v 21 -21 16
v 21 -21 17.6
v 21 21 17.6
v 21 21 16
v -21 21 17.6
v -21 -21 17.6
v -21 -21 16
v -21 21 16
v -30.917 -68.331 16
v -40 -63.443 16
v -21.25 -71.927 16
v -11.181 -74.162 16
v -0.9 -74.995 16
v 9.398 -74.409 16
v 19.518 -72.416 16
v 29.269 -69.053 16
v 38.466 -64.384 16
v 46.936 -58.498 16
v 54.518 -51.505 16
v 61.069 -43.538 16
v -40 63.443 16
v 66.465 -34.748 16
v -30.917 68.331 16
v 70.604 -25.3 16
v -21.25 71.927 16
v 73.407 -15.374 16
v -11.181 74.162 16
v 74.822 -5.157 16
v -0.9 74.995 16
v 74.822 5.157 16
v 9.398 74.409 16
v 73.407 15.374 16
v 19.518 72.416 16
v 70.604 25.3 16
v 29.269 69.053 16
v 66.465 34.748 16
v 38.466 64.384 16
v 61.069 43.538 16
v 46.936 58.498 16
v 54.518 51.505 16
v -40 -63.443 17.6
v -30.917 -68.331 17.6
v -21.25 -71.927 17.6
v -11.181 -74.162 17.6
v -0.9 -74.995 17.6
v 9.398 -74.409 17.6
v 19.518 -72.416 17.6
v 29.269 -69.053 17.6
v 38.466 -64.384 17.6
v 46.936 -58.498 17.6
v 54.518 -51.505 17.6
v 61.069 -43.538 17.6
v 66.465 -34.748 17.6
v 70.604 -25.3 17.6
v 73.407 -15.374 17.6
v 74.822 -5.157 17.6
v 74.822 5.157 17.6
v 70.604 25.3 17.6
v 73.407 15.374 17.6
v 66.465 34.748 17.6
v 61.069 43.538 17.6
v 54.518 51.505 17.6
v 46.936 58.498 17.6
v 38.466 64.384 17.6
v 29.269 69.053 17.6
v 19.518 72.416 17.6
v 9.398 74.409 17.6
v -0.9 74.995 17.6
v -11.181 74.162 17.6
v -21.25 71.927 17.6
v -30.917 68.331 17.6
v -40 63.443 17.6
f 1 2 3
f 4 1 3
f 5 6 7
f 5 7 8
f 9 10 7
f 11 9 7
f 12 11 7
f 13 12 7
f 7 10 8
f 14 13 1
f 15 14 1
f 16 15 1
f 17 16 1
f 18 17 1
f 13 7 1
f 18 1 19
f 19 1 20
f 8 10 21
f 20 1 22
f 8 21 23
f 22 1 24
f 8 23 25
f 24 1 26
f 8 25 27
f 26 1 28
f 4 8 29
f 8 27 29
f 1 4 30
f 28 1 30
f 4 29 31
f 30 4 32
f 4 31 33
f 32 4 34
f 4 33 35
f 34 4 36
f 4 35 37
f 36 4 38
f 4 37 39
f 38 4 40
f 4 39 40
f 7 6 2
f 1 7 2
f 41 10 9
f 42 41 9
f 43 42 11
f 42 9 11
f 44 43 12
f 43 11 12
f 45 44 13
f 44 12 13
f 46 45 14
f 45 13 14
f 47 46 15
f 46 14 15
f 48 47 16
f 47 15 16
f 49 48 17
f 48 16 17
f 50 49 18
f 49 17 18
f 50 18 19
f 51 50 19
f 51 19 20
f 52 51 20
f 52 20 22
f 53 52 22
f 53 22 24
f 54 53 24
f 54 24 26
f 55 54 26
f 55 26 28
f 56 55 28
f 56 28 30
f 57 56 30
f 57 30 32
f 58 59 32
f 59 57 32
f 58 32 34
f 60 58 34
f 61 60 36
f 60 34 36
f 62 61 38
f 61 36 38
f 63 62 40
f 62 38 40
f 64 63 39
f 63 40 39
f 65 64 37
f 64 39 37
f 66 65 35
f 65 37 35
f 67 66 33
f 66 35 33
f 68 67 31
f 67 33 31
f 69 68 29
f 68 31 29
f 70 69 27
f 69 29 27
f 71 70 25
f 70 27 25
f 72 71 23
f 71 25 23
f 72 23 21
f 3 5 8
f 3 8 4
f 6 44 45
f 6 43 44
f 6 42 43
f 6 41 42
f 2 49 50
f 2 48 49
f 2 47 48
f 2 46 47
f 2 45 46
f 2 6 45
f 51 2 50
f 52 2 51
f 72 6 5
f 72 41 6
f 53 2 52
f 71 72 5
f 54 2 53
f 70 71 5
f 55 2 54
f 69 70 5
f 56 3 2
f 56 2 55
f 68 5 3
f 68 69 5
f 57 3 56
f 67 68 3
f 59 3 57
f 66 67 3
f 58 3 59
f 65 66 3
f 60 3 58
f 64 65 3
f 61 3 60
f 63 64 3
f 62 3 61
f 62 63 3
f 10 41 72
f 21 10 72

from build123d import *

# Parameters (mm, degrees)
SKETCH062_R     = 75
PAD043_DEPTH    = 1.6
SKETCH063_W     = 42
SKETCH063_H     = 42
POCKET021_DEPTH = 1.601
SKETCH064_W     = 40
SKETCH064_H     = 130
POCKET022_DEPTH = 1.601


with BuildPart() as part:
    # Sketch062 → Pad043 (new body)
    with BuildSketch(Plane.XY):
        Circle(SKETCH062_R)
    extrude(amount=PAD043_DEPTH)

    # Sketch063 (on Face3 of Pad043) → Pocket021 (cut, through all)
    with BuildSketch(Plane.XY.offset(1.6)):
        Rectangle(SKETCH063_W, SKETCH063_H)
    extrude(amount=-POCKET021_DEPTH, mode=Mode.SUBTRACT)

    # Sketch064 (on Face3 of Pocket021) → Pocket022 (cut, through all)
    with BuildSketch(Plane.XY.offset(1.6)):
        with Locations((-60, 0)):
            Rectangle(SKETCH064_W, SKETCH064_H)
    extrude(amount=-POCKET022_DEPTH, mode=Mode.SUBTRACT)


with BuildPart() as part_1:
    # Body024 placement: moved
    add(part.part.moved(Location((0, 0, 16))))


solid = part_1.part
